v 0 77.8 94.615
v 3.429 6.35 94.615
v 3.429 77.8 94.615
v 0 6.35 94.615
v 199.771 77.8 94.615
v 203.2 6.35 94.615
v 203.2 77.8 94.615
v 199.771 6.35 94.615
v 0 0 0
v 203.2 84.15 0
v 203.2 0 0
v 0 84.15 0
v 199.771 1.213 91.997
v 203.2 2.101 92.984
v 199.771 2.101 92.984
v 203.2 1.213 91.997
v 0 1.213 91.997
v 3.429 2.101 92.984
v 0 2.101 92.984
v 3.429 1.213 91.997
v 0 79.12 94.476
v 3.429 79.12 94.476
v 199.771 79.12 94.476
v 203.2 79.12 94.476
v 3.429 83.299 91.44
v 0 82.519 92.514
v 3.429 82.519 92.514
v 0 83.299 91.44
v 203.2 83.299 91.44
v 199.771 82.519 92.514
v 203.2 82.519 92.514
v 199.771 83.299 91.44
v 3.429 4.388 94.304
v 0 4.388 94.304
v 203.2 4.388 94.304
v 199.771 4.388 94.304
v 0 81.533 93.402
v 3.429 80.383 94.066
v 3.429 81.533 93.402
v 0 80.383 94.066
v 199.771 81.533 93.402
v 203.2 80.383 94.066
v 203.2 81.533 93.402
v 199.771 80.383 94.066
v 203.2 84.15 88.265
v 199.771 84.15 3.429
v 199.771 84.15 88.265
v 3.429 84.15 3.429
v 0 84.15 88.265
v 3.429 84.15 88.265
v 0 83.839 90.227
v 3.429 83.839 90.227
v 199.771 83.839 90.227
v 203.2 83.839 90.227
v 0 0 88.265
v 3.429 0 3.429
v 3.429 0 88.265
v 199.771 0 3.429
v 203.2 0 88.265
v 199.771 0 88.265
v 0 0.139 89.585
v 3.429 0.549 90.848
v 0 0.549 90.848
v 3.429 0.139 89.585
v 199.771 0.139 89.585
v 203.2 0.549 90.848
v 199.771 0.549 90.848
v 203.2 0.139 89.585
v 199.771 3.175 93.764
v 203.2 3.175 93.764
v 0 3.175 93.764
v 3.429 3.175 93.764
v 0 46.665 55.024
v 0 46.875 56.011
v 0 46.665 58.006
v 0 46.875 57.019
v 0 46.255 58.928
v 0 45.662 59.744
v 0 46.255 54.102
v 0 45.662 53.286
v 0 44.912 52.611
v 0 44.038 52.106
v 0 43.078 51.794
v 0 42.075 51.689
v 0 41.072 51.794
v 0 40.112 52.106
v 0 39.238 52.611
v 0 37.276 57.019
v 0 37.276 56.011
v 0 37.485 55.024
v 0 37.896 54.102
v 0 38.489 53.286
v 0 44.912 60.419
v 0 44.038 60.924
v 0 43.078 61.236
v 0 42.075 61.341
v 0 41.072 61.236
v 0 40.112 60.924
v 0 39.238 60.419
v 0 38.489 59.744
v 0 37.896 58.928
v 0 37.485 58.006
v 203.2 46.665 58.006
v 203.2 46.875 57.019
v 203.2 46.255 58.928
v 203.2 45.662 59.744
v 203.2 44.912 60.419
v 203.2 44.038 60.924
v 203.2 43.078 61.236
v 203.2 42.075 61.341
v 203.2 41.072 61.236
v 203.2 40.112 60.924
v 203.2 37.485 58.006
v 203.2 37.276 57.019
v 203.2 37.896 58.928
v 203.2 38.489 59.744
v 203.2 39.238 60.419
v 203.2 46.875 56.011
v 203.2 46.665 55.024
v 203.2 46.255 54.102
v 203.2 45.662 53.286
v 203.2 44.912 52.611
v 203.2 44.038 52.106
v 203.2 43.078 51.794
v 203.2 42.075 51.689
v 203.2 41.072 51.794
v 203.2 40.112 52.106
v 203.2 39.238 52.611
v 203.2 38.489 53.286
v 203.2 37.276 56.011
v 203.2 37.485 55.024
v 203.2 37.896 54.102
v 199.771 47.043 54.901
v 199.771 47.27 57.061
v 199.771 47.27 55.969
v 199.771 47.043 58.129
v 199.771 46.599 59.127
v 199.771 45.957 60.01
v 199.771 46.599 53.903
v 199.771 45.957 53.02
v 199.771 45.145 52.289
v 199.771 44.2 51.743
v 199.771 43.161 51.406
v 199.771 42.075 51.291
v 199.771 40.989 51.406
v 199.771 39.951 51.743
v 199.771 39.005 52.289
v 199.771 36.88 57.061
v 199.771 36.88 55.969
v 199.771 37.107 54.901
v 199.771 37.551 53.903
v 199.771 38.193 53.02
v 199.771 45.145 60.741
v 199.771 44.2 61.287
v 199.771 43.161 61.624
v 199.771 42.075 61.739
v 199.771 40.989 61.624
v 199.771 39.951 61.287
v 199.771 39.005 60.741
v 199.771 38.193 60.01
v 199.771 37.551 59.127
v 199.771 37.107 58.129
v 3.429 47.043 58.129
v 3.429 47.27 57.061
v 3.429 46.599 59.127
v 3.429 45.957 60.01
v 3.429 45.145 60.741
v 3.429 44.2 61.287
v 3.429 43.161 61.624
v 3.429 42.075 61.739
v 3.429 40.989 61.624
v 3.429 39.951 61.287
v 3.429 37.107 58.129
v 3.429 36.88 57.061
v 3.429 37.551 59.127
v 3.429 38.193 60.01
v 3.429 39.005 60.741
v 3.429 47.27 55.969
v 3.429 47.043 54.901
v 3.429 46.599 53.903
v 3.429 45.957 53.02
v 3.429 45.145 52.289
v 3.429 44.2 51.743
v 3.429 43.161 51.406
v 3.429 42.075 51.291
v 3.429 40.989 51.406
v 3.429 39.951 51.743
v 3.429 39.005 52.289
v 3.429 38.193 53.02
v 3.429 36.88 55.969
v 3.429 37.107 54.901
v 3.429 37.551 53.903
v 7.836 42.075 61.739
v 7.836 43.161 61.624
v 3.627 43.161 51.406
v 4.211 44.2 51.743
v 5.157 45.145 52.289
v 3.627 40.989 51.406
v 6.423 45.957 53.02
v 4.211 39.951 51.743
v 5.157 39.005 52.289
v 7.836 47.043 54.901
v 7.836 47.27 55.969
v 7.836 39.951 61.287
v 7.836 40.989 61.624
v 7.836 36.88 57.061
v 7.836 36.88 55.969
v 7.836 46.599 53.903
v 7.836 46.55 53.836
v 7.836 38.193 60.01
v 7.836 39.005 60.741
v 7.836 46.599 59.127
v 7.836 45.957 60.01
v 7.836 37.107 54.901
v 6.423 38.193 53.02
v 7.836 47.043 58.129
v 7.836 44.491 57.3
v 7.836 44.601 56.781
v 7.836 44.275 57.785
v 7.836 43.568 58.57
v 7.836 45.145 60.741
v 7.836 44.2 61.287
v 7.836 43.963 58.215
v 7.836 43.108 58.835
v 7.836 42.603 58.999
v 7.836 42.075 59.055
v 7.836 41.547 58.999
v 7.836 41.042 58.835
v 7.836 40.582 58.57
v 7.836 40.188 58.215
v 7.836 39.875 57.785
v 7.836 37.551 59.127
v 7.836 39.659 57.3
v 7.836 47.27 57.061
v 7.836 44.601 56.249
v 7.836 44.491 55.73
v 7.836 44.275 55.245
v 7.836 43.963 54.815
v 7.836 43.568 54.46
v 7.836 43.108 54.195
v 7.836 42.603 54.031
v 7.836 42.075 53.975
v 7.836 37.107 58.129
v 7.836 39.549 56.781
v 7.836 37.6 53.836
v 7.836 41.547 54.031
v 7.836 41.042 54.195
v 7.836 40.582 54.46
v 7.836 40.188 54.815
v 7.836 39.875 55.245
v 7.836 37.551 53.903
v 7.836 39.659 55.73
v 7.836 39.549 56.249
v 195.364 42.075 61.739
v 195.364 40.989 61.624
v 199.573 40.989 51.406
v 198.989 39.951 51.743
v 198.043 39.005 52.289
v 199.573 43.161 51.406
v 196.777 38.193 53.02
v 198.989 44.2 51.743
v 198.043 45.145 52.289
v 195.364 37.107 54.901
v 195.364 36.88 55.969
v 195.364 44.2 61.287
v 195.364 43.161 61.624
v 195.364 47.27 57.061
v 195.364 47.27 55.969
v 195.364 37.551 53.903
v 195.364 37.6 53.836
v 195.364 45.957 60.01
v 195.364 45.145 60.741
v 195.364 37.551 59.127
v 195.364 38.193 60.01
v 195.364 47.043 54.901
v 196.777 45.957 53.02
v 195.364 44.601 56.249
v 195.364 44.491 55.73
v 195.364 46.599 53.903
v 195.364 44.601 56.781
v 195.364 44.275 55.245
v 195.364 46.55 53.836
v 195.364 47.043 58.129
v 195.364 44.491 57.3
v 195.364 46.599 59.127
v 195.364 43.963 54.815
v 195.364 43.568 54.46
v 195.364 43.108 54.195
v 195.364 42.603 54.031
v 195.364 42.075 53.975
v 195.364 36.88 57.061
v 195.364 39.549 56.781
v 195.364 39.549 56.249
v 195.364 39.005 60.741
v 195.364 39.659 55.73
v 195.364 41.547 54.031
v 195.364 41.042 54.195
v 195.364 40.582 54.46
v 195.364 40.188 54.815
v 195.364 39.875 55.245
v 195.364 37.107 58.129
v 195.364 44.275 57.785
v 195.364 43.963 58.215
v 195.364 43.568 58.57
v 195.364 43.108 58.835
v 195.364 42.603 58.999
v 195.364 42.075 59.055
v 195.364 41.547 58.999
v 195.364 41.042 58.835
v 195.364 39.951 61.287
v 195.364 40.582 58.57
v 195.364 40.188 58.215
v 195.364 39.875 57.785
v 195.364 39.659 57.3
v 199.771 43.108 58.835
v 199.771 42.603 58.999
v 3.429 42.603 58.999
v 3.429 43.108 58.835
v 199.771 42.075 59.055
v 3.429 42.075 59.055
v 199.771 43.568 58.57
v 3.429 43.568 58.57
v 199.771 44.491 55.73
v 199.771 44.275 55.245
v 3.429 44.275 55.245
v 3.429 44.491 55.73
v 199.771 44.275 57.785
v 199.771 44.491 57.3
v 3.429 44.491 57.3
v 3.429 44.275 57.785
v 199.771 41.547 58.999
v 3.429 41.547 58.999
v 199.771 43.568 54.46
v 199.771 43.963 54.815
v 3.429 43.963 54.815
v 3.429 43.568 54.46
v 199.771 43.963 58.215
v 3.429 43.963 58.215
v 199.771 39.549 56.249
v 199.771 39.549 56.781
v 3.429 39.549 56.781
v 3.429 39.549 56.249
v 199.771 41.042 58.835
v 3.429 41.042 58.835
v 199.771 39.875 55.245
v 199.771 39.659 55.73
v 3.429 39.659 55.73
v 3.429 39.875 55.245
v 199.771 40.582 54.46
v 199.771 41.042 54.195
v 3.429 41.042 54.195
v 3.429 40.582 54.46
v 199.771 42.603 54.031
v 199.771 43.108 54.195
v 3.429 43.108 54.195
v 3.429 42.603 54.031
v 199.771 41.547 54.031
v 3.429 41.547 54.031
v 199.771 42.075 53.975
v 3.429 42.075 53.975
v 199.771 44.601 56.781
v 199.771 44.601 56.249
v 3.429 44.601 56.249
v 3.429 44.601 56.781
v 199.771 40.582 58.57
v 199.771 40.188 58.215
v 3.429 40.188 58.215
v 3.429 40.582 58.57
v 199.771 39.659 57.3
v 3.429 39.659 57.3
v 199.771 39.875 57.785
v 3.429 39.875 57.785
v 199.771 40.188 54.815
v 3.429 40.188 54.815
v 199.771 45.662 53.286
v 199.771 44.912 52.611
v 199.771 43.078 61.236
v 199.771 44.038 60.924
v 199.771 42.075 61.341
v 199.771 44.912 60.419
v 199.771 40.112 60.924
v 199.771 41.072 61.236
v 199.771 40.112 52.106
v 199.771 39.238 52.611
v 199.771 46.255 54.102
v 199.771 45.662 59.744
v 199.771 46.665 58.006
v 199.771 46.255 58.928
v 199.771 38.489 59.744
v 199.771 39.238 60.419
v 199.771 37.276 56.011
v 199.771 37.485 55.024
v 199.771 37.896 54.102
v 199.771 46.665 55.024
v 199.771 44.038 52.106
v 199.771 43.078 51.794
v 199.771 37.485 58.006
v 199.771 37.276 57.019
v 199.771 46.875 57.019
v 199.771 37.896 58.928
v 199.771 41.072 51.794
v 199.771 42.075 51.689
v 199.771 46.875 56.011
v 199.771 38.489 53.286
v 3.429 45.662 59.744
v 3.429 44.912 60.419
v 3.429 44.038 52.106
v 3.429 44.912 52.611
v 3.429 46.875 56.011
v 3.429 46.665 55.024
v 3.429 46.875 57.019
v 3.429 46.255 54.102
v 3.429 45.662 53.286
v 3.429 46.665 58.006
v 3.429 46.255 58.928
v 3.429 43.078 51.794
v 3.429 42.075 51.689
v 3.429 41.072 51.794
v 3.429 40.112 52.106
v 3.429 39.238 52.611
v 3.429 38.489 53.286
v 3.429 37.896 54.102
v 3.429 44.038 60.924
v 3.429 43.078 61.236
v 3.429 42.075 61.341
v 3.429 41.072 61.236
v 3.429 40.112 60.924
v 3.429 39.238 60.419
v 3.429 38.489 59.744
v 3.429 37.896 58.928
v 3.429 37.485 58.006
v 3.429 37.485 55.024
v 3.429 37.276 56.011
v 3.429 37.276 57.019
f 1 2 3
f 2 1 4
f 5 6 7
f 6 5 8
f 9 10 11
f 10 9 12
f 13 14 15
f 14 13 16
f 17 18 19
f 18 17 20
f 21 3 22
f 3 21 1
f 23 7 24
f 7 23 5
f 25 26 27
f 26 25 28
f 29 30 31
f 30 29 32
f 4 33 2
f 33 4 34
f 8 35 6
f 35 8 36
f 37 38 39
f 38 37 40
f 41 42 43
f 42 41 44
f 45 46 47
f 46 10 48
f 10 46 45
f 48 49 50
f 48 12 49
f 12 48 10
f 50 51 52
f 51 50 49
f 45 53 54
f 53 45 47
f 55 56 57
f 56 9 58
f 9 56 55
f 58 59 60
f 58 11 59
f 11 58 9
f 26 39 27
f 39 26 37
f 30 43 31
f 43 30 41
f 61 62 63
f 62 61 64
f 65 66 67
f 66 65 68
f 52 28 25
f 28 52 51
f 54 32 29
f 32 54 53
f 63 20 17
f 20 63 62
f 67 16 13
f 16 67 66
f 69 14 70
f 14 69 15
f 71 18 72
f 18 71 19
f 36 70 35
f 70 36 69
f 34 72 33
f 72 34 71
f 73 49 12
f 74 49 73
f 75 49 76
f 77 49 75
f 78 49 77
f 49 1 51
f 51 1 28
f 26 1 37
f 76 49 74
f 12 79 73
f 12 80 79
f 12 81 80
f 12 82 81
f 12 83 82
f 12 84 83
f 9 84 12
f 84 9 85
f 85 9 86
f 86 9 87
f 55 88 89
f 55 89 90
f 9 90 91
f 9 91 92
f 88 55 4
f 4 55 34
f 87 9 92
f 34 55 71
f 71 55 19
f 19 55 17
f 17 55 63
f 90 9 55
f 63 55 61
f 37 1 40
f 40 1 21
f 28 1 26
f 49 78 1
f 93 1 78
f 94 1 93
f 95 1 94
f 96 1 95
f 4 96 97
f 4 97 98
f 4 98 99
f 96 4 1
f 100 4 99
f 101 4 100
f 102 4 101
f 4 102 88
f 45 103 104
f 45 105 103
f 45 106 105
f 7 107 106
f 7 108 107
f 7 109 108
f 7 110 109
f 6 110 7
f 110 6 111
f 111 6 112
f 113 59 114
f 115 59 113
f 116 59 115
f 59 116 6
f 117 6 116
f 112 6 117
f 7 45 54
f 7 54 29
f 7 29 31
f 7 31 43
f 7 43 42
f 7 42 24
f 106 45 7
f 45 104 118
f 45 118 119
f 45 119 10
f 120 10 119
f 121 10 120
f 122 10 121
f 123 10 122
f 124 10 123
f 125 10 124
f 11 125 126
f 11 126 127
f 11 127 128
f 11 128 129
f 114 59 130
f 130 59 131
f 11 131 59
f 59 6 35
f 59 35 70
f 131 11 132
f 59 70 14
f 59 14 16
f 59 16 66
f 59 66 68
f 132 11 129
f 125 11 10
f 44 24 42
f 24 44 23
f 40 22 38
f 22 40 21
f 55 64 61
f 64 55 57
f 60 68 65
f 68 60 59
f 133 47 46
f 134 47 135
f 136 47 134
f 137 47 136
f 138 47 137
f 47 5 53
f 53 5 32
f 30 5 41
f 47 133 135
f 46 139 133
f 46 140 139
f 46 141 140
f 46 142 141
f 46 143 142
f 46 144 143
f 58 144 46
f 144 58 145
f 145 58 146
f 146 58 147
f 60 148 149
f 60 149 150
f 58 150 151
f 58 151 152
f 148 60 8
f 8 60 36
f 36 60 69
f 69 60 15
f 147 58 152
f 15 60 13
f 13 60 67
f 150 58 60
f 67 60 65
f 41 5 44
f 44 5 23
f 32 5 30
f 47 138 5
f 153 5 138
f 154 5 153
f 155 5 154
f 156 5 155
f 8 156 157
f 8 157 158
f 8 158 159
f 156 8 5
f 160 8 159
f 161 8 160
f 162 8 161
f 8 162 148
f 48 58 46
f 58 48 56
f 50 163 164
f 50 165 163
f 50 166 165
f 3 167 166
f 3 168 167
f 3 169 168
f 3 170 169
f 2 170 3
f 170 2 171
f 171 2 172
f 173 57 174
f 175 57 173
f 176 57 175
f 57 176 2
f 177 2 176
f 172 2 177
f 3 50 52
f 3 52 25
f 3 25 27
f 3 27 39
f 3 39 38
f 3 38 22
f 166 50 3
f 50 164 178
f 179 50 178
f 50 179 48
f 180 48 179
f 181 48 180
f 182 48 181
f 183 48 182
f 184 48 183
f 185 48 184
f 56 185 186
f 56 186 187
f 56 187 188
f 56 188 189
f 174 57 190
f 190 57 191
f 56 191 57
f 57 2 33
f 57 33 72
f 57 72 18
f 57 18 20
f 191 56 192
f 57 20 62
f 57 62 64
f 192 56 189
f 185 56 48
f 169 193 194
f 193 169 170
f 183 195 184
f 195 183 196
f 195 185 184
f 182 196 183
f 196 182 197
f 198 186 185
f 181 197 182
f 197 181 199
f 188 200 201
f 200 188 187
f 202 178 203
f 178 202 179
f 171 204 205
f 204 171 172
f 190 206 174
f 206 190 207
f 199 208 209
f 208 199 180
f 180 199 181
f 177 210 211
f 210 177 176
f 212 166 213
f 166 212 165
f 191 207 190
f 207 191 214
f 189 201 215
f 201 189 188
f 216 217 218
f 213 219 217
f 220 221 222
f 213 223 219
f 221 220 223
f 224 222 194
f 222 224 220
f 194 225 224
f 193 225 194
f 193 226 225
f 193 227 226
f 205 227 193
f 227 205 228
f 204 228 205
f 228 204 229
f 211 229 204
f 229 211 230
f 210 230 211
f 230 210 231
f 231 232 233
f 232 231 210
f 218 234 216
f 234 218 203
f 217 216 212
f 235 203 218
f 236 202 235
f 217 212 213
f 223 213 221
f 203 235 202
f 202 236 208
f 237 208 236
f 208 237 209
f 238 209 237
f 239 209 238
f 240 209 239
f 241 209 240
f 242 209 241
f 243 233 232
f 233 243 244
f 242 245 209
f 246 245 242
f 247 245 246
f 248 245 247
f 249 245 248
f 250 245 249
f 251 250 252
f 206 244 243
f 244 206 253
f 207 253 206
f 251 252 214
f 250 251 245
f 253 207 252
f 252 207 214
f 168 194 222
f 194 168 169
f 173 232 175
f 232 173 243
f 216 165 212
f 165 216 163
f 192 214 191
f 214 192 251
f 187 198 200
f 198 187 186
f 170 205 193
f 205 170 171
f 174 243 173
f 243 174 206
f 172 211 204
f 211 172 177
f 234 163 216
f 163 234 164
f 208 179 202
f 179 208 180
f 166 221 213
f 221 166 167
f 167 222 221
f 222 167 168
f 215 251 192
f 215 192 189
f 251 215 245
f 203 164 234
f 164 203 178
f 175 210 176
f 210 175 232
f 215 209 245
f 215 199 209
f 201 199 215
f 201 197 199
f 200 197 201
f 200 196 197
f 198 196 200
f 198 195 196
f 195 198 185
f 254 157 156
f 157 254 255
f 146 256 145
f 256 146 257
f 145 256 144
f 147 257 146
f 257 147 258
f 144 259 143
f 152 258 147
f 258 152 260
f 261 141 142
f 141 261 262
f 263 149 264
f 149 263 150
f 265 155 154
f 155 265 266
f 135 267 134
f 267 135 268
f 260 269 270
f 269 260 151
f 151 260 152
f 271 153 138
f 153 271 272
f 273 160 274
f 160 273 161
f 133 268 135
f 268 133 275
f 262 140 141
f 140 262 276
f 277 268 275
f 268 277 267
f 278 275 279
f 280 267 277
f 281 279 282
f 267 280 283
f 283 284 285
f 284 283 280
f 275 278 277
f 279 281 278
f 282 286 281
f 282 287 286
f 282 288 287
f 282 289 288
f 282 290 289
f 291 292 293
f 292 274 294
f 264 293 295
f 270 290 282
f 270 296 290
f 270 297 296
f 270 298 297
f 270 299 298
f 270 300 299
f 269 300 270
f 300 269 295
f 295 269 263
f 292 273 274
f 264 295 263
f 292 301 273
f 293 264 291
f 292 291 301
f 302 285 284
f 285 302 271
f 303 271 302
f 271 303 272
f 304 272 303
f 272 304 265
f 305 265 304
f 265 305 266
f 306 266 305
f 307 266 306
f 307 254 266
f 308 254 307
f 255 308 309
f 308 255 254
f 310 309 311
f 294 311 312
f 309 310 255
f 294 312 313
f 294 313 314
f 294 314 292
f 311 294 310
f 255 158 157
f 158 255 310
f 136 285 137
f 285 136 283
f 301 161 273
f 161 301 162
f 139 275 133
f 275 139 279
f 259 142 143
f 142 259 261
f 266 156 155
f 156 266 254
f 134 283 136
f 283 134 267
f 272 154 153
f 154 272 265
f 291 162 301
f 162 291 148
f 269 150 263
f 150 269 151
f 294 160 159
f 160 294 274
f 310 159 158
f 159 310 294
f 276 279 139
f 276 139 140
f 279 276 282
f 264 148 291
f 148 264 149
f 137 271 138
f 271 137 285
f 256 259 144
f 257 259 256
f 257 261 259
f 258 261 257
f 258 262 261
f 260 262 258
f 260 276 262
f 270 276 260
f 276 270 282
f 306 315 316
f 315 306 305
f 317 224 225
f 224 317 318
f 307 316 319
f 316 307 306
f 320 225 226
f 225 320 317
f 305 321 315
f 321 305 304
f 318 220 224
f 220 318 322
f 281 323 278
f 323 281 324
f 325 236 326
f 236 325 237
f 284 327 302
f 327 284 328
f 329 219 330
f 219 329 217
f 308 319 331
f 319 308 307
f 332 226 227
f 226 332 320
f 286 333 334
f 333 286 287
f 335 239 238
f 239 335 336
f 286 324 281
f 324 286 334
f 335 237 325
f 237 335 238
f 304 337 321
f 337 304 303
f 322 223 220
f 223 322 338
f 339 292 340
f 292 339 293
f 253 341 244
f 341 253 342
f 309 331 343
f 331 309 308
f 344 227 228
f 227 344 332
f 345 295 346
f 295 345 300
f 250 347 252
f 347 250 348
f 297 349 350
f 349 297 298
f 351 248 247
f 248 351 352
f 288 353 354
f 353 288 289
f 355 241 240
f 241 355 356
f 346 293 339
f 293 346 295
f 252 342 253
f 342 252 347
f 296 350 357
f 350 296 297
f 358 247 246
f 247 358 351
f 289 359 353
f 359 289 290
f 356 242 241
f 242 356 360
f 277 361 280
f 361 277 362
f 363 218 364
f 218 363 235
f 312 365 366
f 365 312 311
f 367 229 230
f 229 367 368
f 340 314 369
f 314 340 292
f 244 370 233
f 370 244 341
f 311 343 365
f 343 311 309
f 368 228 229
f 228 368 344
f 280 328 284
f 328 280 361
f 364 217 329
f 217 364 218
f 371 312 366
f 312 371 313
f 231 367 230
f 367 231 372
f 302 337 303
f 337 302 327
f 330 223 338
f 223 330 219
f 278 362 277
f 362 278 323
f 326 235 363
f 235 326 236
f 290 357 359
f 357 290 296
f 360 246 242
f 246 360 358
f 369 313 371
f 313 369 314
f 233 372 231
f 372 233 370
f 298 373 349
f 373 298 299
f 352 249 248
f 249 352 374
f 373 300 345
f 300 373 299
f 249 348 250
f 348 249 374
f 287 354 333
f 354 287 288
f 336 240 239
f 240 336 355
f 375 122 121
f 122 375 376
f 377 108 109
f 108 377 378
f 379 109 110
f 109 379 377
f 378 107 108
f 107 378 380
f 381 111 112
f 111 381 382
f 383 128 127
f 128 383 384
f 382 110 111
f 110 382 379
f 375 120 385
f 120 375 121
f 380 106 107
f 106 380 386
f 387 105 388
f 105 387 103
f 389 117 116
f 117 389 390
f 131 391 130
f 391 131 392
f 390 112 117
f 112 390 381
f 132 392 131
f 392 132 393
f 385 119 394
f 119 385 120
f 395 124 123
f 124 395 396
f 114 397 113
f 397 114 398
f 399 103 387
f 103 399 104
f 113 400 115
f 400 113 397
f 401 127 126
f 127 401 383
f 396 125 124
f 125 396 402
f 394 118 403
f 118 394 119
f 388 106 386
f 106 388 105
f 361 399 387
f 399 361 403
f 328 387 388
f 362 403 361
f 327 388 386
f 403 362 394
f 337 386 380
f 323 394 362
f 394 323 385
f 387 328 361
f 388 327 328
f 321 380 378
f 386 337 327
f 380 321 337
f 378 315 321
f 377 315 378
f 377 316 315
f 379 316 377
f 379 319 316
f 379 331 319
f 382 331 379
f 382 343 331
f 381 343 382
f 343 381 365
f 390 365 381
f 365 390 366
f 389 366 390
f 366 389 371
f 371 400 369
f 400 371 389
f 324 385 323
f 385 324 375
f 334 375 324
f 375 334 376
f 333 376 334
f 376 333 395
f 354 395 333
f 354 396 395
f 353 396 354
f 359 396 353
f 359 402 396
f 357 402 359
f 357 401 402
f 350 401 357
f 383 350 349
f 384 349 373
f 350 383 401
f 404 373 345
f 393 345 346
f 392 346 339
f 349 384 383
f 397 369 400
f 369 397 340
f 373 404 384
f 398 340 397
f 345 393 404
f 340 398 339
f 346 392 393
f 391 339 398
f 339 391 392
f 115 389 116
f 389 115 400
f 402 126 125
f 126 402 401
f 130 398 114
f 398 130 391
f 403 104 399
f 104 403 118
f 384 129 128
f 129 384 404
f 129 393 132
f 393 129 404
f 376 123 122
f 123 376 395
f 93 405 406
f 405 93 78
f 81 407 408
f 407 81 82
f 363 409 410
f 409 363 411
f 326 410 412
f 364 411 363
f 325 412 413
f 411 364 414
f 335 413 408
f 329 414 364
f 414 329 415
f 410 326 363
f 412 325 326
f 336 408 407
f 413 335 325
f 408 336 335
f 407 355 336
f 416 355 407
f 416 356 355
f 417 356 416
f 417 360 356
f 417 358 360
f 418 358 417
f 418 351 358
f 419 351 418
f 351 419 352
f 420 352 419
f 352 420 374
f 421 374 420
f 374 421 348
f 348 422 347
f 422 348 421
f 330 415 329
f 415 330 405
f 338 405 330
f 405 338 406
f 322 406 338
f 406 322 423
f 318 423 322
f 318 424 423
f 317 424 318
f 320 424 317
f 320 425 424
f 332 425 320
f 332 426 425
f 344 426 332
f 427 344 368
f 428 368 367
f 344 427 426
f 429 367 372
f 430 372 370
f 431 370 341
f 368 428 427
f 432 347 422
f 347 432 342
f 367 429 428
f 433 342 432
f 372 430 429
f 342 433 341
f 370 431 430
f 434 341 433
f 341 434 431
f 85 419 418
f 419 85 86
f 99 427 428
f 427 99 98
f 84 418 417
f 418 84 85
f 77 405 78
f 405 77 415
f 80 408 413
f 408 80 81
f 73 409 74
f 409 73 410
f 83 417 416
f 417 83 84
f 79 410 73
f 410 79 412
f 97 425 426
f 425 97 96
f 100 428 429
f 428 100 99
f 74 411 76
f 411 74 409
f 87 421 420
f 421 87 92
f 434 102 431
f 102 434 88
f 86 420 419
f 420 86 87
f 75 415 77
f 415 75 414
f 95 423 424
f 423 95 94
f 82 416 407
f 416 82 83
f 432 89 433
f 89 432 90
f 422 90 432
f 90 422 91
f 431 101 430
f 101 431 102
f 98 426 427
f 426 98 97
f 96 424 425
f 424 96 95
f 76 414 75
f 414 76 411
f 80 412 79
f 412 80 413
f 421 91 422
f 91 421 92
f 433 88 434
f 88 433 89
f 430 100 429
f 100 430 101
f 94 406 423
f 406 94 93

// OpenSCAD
// not metal, so thicker
BracketPrintThicknessThou = 135; 
// The plastic thickness limits pivot angle w.r.t. OEM metal brack. Make taller to compensate
BoostHeightToIncreasePivotAngleThou = 100; 

// The OEM bracket has two pivot holes. 3D print only the one you select
PivotHolePosition = "bottom"; // [bottom, top]

module __none__() {}

// measured...
Hole1ZoffsetThou = 1500; // from top of bracket
Hole2ZoffsetThou = 438; // ditto
BracketHeightThou = 3625; 
BracketWidthThou = 8000;    // measured
BracketDepthThou = 3313;    // measured
PivotThreadRecessDiameterThou = 457; // measured
PivotThreadRecessDepthThou = 90; // measured
ConsoleWidthThou = 7563; // measured
BracketTopRoundRadiusThou = 250;    // measured
HoleDiameterThou = 200; // OEM console is threaded #8-32
HeadDiameterThou = 380; // ditto
HeadThicknessThou = 135; // ditto

BracketCompensatedHeightThou = BracketHeightThou + BoostHeightToIncreasePivotAngleThou;

PivotHoleZThou = PivotHolePosition == "bottom" ? (BracketCompensatedHeightThou - Hole1ZoffsetThou) : (BracketCompensatedHeightThou - Hole2ZoffsetThou);

mmPerThou = .0254;

echo ("Console screw head clearance = ", 0.5*(BracketWidthThou - ConsoleWidthThou) - BracketPrintThicknessThou, " thou");

module mount()
{
    difference()
    {
        diam = PivotThreadRecessDiameterThou * 0.9;
        peg = PivotThreadRecessDepthThou + 0.5*(BracketWidthThou - ConsoleWidthThou);
        cylinder(h=peg, d=diam);
        translate([0,0,BracketPrintThicknessThou])
        translate([diam/2,-diam/2])
        rotate([0,-30])
        cube([peg, diam, diam]);
    }
}

scale(mmPerThou)
{
    PivotYPos = BracketDepthThou/2;
    difference()
    {
        union()
        {
            difference()
            {
                profile1=[[0,0], [0,BracketDepthThou], [BracketCompensatedHeightThou, BracketDepthThou], [BracketCompensatedHeightThou,0]];
                profile2=[[0,0], [0,BracketDepthThou], [BracketTopRoundRadiusThou, BracketDepthThou], [BracketTopRoundRadiusThou,0]];
                translate([BracketWidthThou,0,0])
                rotate([0,-90])
                linear_extrude(height=BracketWidthThou)
                {
                    offset(BracketTopRoundRadiusThou)
                    offset(-BracketTopRoundRadiusThou)
                        polygon(profile1);
                    polygon(profile2);
                } 
                translate([BracketPrintThicknessThou, 0, BracketPrintThicknessThou])
                    cube([BracketWidthThou - 2 * BracketPrintThicknessThou, BracketDepthThou, BracketCompensatedHeightThou]);
            }

            translate([0, PivotYPos, PivotHoleZThou])
                rotate([0,90])
                    mount();
            translate([BracketWidthThou, PivotYPos, PivotHoleZThou])
                rotate([0,90, 180])
                    mount();

        }

        translate([0, PivotYPos, PivotHoleZThou])
        {
            translate([BracketWidthThou,0])
            rotate([0,-90])
            {
                cylinder(h=BracketWidthThou, d = HoleDiameterThou);
                cylinder(h=HeadThicknessThou, d = HeadDiameterThou);
            }
            rotate([0,90])
                #cylinder(h=HeadThicknessThou, d = HeadDiameterThou);
        }  
    }
}
